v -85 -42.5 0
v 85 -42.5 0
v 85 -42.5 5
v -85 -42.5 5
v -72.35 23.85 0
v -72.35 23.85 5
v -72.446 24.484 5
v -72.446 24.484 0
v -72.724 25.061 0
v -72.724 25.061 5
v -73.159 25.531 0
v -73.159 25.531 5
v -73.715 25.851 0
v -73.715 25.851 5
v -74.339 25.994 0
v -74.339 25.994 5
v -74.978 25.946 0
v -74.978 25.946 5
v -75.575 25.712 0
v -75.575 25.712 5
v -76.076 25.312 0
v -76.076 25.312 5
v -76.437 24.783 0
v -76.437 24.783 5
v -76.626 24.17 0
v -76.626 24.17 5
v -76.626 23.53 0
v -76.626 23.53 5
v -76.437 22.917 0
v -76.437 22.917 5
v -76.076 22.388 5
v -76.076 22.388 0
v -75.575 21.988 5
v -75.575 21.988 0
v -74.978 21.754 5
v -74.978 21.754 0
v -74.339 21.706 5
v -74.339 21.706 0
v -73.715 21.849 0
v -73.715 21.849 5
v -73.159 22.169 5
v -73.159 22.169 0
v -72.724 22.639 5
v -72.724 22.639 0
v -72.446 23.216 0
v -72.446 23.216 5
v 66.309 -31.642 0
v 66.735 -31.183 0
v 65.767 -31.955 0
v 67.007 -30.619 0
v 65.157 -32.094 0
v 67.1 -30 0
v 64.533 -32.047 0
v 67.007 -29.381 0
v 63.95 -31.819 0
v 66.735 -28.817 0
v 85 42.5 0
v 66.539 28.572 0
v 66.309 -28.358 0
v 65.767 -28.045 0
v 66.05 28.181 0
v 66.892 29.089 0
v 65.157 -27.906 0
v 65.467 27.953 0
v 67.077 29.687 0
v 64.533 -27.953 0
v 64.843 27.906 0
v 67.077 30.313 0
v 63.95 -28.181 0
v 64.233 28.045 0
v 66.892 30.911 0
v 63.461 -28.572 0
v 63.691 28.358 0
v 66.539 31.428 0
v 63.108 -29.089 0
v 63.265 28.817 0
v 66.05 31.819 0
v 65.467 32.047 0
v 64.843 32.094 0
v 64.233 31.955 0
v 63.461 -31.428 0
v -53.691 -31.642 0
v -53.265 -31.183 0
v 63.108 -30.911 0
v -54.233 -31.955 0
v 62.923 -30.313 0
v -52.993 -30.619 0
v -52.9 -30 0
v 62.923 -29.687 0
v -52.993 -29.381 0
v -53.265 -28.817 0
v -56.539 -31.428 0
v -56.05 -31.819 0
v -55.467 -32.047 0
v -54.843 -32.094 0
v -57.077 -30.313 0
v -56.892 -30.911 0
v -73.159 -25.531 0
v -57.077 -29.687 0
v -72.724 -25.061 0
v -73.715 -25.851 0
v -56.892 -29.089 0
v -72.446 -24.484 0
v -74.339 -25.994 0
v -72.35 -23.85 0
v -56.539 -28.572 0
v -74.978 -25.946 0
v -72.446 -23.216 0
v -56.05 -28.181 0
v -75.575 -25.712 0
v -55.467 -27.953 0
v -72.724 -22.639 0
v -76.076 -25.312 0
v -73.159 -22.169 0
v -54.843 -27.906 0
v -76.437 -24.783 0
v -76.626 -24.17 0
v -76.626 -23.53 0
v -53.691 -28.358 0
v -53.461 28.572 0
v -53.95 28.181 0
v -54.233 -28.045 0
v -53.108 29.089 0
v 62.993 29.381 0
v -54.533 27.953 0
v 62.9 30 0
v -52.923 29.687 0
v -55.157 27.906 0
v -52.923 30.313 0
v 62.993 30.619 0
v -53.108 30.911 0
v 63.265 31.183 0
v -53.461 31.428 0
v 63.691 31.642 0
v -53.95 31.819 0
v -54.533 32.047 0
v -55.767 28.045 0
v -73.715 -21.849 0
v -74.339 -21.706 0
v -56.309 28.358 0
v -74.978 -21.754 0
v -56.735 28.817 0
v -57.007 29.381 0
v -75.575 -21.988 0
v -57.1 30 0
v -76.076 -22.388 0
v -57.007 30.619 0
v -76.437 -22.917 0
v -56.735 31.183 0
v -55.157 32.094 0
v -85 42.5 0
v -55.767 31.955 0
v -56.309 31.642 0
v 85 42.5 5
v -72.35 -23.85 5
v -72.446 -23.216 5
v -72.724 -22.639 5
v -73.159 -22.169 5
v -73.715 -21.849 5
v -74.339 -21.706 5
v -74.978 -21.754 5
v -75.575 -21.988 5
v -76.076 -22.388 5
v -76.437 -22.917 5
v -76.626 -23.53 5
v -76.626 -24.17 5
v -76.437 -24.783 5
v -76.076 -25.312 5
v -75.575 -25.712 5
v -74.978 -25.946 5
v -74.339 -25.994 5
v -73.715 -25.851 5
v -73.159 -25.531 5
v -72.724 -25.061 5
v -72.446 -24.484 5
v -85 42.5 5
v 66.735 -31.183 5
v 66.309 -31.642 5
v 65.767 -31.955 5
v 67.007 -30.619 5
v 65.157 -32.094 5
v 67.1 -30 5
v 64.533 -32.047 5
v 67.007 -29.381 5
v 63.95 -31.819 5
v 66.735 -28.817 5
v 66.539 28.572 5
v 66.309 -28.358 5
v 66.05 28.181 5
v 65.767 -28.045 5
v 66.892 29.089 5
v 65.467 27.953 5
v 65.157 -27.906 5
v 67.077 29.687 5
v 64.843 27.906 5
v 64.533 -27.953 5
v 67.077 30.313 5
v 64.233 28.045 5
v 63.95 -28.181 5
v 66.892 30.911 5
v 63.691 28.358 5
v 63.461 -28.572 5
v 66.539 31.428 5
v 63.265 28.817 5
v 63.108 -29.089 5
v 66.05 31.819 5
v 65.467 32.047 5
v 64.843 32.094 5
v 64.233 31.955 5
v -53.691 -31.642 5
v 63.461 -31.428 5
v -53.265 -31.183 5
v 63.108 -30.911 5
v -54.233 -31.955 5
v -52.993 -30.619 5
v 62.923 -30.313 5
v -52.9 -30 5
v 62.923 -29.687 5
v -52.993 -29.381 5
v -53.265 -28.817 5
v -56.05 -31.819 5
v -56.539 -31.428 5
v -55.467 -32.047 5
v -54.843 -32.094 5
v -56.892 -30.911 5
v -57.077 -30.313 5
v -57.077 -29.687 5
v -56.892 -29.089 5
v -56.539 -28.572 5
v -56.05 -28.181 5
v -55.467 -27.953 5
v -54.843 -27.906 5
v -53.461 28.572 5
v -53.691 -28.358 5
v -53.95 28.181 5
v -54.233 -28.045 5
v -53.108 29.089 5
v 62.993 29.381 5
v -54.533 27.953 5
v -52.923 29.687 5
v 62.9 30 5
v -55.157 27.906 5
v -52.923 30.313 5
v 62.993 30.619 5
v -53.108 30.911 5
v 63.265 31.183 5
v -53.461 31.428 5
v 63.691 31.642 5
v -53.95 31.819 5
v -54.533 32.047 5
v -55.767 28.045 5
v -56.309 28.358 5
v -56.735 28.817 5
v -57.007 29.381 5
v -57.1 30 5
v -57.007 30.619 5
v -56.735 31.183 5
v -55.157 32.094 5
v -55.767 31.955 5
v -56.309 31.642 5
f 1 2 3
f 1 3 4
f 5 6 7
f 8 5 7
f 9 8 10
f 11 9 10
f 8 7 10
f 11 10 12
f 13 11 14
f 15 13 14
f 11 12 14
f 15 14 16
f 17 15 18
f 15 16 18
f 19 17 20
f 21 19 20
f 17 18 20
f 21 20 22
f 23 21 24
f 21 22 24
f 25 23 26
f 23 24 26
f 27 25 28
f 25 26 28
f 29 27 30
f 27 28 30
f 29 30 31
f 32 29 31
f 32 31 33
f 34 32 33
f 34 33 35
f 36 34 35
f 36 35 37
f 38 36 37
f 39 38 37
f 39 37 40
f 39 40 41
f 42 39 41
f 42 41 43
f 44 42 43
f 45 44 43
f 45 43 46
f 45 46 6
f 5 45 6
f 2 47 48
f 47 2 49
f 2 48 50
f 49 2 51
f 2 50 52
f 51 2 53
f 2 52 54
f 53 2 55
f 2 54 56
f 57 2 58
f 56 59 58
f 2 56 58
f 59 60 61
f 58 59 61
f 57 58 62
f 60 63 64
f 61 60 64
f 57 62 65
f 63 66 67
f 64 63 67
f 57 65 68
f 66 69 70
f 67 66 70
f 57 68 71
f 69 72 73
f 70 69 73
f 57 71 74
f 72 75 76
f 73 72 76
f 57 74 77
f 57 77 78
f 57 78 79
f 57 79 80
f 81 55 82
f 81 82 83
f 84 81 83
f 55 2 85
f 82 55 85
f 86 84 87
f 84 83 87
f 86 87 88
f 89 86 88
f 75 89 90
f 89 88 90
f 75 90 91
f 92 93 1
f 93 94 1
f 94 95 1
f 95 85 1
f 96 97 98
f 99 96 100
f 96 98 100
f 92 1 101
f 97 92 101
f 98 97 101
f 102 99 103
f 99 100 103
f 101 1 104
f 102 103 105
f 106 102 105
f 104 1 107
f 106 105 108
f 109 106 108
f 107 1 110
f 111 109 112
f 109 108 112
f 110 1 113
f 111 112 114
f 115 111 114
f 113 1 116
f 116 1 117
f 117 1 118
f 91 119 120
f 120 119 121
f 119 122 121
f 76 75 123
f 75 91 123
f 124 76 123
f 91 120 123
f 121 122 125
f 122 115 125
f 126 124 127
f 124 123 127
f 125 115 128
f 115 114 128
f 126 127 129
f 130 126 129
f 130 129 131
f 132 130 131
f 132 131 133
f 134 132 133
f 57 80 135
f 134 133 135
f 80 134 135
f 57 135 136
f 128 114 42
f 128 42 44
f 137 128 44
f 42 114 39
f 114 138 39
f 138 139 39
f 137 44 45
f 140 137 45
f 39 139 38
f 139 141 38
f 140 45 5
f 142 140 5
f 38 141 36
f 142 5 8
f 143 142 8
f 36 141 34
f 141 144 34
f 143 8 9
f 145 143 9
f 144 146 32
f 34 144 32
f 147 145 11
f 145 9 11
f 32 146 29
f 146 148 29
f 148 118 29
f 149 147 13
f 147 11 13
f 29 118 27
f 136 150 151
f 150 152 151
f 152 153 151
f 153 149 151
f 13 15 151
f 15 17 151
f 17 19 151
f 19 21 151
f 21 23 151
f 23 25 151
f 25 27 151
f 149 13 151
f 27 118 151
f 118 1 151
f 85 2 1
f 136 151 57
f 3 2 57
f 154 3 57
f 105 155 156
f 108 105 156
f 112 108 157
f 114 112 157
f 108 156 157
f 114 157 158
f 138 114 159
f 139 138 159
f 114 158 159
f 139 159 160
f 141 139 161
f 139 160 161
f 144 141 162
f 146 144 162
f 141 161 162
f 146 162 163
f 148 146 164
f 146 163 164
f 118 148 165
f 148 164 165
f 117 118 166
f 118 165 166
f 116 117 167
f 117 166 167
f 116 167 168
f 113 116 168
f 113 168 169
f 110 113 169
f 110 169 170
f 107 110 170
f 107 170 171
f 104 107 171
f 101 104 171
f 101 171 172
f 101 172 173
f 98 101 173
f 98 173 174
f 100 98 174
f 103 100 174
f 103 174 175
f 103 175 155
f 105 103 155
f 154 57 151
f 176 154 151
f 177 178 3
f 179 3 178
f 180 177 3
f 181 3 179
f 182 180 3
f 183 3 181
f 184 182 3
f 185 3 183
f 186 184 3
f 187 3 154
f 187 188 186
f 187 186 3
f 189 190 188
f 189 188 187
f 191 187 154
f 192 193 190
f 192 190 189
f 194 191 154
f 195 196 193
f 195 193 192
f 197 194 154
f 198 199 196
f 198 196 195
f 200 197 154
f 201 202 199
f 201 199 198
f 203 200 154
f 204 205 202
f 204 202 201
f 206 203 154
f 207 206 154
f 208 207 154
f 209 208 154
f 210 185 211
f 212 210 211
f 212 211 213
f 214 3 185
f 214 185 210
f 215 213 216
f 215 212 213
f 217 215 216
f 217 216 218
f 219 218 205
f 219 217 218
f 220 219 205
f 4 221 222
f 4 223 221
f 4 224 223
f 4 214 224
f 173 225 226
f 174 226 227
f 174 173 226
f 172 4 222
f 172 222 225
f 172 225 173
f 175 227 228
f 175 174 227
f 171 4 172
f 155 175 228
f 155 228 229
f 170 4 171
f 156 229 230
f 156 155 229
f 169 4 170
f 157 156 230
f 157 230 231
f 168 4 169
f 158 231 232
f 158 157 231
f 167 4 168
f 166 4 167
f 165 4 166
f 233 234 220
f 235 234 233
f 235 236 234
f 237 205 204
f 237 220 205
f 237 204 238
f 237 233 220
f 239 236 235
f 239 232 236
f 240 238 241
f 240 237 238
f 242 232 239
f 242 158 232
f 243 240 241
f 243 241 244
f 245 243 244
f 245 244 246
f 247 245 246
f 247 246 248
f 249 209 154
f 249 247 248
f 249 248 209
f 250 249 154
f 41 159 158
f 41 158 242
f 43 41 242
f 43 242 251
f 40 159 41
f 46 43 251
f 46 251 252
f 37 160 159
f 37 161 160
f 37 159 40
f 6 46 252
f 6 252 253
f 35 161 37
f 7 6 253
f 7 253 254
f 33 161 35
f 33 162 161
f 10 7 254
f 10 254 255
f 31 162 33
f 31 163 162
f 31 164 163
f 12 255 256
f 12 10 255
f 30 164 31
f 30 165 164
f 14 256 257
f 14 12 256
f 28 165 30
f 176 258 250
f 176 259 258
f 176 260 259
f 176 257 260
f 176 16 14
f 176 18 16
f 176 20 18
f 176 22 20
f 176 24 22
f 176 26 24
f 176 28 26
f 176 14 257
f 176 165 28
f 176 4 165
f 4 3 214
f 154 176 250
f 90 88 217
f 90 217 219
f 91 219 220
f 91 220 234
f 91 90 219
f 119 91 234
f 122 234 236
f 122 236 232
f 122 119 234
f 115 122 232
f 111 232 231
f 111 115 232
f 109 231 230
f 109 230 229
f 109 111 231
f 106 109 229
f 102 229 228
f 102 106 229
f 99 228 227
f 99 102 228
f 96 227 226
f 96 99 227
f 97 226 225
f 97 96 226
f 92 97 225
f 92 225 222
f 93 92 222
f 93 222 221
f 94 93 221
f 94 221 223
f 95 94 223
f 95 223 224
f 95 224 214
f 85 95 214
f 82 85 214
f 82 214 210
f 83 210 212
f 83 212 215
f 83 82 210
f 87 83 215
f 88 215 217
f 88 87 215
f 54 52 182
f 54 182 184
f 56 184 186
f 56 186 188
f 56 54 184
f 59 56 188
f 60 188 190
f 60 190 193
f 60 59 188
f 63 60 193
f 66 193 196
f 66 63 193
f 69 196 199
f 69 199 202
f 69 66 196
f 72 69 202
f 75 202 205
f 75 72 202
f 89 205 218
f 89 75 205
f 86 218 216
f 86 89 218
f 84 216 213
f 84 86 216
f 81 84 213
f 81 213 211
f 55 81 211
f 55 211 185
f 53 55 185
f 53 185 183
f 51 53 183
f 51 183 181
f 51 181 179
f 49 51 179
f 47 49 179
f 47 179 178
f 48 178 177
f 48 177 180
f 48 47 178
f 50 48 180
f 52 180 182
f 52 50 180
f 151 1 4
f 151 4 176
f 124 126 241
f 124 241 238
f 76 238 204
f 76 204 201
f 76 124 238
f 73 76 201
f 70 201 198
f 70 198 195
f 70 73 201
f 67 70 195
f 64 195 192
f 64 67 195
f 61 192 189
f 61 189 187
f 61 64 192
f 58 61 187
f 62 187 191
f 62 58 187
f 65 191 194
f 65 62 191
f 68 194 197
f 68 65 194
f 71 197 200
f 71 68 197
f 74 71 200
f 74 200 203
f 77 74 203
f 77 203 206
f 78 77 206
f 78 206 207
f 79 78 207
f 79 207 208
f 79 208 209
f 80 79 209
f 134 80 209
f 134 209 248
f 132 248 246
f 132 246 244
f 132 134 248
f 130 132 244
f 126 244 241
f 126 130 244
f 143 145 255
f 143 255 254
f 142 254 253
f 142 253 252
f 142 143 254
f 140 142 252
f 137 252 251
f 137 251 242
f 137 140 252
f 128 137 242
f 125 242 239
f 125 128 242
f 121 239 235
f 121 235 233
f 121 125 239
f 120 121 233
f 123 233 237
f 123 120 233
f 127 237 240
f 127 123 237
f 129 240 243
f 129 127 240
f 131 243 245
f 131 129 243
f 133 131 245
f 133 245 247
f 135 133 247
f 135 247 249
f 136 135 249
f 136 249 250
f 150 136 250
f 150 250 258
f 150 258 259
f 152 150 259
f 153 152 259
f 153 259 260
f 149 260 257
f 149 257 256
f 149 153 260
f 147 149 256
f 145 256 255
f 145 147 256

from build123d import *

# Parameters (mm, degrees)
SKETCH1_W           = 85
SKETCH1_H           = 170
SKETCH1_R           = 2.1
BOSS_EXTRUDE1_DEPTH = 5
SKETCH2_R           = 2.15
CUT_EXTRUDE1_DEPTH  = 10
SKETCH3_R           = 2.15
CUT_EXTRUDE2_DEPTH  = 10


with BuildPart() as part:
    # Sketch1 → Boss-Extrude1 (new body)
    with BuildSketch(Plane(origin=(0, 0, 0), x_dir=(0, 1, 0), z_dir=(0, 0, 1))):
        Rectangle(SKETCH1_W, SKETCH1_H)
        with Locations(Location((-30, 55, 0), (0, 0, 270))):
            Circle(SKETCH1_R, mode=Mode.SUBTRACT)
        with Locations(Location((-30, -65, 0), (0, 0, 270))):
            Circle(SKETCH1_R, mode=Mode.SUBTRACT)
        with Locations(Location((30, -65, 0), (0, 0, 90))):
            Circle(SKETCH1_R, mode=Mode.SUBTRACT)
        with Locations(Location((30, 55, 0), (0, 0, 90))):
            Circle(SKETCH1_R, mode=Mode.SUBTRACT)
    extrude(amount=BOSS_EXTRUDE1_DEPTH)

    # Sketch2 → Cut-Extrude1 (cut)
    with BuildSketch(Plane(origin=(0, 0, 5), x_dir=(0, -1, 0), z_dir=(0, 0, 1))):
        with Locations(Location((23.85, -74.5, 0), (0, 0, 90))):
            Circle(SKETCH2_R)
    extrude(amount=-CUT_EXTRUDE1_DEPTH, mode=Mode.SUBTRACT)

    # Sketch3 → Cut-Extrude2 (cut)
    with BuildSketch(Plane(origin=(0, 0, 5), x_dir=(0, -1, 0), z_dir=(0, 0, 1))):
        with Locations(Location((-23.85, -74.5, 0), (0, 0, 90))):
            Circle(SKETCH3_R)
    extrude(amount=-CUT_EXTRUDE2_DEPTH, mode=Mode.SUBTRACT)


solid = part.part
